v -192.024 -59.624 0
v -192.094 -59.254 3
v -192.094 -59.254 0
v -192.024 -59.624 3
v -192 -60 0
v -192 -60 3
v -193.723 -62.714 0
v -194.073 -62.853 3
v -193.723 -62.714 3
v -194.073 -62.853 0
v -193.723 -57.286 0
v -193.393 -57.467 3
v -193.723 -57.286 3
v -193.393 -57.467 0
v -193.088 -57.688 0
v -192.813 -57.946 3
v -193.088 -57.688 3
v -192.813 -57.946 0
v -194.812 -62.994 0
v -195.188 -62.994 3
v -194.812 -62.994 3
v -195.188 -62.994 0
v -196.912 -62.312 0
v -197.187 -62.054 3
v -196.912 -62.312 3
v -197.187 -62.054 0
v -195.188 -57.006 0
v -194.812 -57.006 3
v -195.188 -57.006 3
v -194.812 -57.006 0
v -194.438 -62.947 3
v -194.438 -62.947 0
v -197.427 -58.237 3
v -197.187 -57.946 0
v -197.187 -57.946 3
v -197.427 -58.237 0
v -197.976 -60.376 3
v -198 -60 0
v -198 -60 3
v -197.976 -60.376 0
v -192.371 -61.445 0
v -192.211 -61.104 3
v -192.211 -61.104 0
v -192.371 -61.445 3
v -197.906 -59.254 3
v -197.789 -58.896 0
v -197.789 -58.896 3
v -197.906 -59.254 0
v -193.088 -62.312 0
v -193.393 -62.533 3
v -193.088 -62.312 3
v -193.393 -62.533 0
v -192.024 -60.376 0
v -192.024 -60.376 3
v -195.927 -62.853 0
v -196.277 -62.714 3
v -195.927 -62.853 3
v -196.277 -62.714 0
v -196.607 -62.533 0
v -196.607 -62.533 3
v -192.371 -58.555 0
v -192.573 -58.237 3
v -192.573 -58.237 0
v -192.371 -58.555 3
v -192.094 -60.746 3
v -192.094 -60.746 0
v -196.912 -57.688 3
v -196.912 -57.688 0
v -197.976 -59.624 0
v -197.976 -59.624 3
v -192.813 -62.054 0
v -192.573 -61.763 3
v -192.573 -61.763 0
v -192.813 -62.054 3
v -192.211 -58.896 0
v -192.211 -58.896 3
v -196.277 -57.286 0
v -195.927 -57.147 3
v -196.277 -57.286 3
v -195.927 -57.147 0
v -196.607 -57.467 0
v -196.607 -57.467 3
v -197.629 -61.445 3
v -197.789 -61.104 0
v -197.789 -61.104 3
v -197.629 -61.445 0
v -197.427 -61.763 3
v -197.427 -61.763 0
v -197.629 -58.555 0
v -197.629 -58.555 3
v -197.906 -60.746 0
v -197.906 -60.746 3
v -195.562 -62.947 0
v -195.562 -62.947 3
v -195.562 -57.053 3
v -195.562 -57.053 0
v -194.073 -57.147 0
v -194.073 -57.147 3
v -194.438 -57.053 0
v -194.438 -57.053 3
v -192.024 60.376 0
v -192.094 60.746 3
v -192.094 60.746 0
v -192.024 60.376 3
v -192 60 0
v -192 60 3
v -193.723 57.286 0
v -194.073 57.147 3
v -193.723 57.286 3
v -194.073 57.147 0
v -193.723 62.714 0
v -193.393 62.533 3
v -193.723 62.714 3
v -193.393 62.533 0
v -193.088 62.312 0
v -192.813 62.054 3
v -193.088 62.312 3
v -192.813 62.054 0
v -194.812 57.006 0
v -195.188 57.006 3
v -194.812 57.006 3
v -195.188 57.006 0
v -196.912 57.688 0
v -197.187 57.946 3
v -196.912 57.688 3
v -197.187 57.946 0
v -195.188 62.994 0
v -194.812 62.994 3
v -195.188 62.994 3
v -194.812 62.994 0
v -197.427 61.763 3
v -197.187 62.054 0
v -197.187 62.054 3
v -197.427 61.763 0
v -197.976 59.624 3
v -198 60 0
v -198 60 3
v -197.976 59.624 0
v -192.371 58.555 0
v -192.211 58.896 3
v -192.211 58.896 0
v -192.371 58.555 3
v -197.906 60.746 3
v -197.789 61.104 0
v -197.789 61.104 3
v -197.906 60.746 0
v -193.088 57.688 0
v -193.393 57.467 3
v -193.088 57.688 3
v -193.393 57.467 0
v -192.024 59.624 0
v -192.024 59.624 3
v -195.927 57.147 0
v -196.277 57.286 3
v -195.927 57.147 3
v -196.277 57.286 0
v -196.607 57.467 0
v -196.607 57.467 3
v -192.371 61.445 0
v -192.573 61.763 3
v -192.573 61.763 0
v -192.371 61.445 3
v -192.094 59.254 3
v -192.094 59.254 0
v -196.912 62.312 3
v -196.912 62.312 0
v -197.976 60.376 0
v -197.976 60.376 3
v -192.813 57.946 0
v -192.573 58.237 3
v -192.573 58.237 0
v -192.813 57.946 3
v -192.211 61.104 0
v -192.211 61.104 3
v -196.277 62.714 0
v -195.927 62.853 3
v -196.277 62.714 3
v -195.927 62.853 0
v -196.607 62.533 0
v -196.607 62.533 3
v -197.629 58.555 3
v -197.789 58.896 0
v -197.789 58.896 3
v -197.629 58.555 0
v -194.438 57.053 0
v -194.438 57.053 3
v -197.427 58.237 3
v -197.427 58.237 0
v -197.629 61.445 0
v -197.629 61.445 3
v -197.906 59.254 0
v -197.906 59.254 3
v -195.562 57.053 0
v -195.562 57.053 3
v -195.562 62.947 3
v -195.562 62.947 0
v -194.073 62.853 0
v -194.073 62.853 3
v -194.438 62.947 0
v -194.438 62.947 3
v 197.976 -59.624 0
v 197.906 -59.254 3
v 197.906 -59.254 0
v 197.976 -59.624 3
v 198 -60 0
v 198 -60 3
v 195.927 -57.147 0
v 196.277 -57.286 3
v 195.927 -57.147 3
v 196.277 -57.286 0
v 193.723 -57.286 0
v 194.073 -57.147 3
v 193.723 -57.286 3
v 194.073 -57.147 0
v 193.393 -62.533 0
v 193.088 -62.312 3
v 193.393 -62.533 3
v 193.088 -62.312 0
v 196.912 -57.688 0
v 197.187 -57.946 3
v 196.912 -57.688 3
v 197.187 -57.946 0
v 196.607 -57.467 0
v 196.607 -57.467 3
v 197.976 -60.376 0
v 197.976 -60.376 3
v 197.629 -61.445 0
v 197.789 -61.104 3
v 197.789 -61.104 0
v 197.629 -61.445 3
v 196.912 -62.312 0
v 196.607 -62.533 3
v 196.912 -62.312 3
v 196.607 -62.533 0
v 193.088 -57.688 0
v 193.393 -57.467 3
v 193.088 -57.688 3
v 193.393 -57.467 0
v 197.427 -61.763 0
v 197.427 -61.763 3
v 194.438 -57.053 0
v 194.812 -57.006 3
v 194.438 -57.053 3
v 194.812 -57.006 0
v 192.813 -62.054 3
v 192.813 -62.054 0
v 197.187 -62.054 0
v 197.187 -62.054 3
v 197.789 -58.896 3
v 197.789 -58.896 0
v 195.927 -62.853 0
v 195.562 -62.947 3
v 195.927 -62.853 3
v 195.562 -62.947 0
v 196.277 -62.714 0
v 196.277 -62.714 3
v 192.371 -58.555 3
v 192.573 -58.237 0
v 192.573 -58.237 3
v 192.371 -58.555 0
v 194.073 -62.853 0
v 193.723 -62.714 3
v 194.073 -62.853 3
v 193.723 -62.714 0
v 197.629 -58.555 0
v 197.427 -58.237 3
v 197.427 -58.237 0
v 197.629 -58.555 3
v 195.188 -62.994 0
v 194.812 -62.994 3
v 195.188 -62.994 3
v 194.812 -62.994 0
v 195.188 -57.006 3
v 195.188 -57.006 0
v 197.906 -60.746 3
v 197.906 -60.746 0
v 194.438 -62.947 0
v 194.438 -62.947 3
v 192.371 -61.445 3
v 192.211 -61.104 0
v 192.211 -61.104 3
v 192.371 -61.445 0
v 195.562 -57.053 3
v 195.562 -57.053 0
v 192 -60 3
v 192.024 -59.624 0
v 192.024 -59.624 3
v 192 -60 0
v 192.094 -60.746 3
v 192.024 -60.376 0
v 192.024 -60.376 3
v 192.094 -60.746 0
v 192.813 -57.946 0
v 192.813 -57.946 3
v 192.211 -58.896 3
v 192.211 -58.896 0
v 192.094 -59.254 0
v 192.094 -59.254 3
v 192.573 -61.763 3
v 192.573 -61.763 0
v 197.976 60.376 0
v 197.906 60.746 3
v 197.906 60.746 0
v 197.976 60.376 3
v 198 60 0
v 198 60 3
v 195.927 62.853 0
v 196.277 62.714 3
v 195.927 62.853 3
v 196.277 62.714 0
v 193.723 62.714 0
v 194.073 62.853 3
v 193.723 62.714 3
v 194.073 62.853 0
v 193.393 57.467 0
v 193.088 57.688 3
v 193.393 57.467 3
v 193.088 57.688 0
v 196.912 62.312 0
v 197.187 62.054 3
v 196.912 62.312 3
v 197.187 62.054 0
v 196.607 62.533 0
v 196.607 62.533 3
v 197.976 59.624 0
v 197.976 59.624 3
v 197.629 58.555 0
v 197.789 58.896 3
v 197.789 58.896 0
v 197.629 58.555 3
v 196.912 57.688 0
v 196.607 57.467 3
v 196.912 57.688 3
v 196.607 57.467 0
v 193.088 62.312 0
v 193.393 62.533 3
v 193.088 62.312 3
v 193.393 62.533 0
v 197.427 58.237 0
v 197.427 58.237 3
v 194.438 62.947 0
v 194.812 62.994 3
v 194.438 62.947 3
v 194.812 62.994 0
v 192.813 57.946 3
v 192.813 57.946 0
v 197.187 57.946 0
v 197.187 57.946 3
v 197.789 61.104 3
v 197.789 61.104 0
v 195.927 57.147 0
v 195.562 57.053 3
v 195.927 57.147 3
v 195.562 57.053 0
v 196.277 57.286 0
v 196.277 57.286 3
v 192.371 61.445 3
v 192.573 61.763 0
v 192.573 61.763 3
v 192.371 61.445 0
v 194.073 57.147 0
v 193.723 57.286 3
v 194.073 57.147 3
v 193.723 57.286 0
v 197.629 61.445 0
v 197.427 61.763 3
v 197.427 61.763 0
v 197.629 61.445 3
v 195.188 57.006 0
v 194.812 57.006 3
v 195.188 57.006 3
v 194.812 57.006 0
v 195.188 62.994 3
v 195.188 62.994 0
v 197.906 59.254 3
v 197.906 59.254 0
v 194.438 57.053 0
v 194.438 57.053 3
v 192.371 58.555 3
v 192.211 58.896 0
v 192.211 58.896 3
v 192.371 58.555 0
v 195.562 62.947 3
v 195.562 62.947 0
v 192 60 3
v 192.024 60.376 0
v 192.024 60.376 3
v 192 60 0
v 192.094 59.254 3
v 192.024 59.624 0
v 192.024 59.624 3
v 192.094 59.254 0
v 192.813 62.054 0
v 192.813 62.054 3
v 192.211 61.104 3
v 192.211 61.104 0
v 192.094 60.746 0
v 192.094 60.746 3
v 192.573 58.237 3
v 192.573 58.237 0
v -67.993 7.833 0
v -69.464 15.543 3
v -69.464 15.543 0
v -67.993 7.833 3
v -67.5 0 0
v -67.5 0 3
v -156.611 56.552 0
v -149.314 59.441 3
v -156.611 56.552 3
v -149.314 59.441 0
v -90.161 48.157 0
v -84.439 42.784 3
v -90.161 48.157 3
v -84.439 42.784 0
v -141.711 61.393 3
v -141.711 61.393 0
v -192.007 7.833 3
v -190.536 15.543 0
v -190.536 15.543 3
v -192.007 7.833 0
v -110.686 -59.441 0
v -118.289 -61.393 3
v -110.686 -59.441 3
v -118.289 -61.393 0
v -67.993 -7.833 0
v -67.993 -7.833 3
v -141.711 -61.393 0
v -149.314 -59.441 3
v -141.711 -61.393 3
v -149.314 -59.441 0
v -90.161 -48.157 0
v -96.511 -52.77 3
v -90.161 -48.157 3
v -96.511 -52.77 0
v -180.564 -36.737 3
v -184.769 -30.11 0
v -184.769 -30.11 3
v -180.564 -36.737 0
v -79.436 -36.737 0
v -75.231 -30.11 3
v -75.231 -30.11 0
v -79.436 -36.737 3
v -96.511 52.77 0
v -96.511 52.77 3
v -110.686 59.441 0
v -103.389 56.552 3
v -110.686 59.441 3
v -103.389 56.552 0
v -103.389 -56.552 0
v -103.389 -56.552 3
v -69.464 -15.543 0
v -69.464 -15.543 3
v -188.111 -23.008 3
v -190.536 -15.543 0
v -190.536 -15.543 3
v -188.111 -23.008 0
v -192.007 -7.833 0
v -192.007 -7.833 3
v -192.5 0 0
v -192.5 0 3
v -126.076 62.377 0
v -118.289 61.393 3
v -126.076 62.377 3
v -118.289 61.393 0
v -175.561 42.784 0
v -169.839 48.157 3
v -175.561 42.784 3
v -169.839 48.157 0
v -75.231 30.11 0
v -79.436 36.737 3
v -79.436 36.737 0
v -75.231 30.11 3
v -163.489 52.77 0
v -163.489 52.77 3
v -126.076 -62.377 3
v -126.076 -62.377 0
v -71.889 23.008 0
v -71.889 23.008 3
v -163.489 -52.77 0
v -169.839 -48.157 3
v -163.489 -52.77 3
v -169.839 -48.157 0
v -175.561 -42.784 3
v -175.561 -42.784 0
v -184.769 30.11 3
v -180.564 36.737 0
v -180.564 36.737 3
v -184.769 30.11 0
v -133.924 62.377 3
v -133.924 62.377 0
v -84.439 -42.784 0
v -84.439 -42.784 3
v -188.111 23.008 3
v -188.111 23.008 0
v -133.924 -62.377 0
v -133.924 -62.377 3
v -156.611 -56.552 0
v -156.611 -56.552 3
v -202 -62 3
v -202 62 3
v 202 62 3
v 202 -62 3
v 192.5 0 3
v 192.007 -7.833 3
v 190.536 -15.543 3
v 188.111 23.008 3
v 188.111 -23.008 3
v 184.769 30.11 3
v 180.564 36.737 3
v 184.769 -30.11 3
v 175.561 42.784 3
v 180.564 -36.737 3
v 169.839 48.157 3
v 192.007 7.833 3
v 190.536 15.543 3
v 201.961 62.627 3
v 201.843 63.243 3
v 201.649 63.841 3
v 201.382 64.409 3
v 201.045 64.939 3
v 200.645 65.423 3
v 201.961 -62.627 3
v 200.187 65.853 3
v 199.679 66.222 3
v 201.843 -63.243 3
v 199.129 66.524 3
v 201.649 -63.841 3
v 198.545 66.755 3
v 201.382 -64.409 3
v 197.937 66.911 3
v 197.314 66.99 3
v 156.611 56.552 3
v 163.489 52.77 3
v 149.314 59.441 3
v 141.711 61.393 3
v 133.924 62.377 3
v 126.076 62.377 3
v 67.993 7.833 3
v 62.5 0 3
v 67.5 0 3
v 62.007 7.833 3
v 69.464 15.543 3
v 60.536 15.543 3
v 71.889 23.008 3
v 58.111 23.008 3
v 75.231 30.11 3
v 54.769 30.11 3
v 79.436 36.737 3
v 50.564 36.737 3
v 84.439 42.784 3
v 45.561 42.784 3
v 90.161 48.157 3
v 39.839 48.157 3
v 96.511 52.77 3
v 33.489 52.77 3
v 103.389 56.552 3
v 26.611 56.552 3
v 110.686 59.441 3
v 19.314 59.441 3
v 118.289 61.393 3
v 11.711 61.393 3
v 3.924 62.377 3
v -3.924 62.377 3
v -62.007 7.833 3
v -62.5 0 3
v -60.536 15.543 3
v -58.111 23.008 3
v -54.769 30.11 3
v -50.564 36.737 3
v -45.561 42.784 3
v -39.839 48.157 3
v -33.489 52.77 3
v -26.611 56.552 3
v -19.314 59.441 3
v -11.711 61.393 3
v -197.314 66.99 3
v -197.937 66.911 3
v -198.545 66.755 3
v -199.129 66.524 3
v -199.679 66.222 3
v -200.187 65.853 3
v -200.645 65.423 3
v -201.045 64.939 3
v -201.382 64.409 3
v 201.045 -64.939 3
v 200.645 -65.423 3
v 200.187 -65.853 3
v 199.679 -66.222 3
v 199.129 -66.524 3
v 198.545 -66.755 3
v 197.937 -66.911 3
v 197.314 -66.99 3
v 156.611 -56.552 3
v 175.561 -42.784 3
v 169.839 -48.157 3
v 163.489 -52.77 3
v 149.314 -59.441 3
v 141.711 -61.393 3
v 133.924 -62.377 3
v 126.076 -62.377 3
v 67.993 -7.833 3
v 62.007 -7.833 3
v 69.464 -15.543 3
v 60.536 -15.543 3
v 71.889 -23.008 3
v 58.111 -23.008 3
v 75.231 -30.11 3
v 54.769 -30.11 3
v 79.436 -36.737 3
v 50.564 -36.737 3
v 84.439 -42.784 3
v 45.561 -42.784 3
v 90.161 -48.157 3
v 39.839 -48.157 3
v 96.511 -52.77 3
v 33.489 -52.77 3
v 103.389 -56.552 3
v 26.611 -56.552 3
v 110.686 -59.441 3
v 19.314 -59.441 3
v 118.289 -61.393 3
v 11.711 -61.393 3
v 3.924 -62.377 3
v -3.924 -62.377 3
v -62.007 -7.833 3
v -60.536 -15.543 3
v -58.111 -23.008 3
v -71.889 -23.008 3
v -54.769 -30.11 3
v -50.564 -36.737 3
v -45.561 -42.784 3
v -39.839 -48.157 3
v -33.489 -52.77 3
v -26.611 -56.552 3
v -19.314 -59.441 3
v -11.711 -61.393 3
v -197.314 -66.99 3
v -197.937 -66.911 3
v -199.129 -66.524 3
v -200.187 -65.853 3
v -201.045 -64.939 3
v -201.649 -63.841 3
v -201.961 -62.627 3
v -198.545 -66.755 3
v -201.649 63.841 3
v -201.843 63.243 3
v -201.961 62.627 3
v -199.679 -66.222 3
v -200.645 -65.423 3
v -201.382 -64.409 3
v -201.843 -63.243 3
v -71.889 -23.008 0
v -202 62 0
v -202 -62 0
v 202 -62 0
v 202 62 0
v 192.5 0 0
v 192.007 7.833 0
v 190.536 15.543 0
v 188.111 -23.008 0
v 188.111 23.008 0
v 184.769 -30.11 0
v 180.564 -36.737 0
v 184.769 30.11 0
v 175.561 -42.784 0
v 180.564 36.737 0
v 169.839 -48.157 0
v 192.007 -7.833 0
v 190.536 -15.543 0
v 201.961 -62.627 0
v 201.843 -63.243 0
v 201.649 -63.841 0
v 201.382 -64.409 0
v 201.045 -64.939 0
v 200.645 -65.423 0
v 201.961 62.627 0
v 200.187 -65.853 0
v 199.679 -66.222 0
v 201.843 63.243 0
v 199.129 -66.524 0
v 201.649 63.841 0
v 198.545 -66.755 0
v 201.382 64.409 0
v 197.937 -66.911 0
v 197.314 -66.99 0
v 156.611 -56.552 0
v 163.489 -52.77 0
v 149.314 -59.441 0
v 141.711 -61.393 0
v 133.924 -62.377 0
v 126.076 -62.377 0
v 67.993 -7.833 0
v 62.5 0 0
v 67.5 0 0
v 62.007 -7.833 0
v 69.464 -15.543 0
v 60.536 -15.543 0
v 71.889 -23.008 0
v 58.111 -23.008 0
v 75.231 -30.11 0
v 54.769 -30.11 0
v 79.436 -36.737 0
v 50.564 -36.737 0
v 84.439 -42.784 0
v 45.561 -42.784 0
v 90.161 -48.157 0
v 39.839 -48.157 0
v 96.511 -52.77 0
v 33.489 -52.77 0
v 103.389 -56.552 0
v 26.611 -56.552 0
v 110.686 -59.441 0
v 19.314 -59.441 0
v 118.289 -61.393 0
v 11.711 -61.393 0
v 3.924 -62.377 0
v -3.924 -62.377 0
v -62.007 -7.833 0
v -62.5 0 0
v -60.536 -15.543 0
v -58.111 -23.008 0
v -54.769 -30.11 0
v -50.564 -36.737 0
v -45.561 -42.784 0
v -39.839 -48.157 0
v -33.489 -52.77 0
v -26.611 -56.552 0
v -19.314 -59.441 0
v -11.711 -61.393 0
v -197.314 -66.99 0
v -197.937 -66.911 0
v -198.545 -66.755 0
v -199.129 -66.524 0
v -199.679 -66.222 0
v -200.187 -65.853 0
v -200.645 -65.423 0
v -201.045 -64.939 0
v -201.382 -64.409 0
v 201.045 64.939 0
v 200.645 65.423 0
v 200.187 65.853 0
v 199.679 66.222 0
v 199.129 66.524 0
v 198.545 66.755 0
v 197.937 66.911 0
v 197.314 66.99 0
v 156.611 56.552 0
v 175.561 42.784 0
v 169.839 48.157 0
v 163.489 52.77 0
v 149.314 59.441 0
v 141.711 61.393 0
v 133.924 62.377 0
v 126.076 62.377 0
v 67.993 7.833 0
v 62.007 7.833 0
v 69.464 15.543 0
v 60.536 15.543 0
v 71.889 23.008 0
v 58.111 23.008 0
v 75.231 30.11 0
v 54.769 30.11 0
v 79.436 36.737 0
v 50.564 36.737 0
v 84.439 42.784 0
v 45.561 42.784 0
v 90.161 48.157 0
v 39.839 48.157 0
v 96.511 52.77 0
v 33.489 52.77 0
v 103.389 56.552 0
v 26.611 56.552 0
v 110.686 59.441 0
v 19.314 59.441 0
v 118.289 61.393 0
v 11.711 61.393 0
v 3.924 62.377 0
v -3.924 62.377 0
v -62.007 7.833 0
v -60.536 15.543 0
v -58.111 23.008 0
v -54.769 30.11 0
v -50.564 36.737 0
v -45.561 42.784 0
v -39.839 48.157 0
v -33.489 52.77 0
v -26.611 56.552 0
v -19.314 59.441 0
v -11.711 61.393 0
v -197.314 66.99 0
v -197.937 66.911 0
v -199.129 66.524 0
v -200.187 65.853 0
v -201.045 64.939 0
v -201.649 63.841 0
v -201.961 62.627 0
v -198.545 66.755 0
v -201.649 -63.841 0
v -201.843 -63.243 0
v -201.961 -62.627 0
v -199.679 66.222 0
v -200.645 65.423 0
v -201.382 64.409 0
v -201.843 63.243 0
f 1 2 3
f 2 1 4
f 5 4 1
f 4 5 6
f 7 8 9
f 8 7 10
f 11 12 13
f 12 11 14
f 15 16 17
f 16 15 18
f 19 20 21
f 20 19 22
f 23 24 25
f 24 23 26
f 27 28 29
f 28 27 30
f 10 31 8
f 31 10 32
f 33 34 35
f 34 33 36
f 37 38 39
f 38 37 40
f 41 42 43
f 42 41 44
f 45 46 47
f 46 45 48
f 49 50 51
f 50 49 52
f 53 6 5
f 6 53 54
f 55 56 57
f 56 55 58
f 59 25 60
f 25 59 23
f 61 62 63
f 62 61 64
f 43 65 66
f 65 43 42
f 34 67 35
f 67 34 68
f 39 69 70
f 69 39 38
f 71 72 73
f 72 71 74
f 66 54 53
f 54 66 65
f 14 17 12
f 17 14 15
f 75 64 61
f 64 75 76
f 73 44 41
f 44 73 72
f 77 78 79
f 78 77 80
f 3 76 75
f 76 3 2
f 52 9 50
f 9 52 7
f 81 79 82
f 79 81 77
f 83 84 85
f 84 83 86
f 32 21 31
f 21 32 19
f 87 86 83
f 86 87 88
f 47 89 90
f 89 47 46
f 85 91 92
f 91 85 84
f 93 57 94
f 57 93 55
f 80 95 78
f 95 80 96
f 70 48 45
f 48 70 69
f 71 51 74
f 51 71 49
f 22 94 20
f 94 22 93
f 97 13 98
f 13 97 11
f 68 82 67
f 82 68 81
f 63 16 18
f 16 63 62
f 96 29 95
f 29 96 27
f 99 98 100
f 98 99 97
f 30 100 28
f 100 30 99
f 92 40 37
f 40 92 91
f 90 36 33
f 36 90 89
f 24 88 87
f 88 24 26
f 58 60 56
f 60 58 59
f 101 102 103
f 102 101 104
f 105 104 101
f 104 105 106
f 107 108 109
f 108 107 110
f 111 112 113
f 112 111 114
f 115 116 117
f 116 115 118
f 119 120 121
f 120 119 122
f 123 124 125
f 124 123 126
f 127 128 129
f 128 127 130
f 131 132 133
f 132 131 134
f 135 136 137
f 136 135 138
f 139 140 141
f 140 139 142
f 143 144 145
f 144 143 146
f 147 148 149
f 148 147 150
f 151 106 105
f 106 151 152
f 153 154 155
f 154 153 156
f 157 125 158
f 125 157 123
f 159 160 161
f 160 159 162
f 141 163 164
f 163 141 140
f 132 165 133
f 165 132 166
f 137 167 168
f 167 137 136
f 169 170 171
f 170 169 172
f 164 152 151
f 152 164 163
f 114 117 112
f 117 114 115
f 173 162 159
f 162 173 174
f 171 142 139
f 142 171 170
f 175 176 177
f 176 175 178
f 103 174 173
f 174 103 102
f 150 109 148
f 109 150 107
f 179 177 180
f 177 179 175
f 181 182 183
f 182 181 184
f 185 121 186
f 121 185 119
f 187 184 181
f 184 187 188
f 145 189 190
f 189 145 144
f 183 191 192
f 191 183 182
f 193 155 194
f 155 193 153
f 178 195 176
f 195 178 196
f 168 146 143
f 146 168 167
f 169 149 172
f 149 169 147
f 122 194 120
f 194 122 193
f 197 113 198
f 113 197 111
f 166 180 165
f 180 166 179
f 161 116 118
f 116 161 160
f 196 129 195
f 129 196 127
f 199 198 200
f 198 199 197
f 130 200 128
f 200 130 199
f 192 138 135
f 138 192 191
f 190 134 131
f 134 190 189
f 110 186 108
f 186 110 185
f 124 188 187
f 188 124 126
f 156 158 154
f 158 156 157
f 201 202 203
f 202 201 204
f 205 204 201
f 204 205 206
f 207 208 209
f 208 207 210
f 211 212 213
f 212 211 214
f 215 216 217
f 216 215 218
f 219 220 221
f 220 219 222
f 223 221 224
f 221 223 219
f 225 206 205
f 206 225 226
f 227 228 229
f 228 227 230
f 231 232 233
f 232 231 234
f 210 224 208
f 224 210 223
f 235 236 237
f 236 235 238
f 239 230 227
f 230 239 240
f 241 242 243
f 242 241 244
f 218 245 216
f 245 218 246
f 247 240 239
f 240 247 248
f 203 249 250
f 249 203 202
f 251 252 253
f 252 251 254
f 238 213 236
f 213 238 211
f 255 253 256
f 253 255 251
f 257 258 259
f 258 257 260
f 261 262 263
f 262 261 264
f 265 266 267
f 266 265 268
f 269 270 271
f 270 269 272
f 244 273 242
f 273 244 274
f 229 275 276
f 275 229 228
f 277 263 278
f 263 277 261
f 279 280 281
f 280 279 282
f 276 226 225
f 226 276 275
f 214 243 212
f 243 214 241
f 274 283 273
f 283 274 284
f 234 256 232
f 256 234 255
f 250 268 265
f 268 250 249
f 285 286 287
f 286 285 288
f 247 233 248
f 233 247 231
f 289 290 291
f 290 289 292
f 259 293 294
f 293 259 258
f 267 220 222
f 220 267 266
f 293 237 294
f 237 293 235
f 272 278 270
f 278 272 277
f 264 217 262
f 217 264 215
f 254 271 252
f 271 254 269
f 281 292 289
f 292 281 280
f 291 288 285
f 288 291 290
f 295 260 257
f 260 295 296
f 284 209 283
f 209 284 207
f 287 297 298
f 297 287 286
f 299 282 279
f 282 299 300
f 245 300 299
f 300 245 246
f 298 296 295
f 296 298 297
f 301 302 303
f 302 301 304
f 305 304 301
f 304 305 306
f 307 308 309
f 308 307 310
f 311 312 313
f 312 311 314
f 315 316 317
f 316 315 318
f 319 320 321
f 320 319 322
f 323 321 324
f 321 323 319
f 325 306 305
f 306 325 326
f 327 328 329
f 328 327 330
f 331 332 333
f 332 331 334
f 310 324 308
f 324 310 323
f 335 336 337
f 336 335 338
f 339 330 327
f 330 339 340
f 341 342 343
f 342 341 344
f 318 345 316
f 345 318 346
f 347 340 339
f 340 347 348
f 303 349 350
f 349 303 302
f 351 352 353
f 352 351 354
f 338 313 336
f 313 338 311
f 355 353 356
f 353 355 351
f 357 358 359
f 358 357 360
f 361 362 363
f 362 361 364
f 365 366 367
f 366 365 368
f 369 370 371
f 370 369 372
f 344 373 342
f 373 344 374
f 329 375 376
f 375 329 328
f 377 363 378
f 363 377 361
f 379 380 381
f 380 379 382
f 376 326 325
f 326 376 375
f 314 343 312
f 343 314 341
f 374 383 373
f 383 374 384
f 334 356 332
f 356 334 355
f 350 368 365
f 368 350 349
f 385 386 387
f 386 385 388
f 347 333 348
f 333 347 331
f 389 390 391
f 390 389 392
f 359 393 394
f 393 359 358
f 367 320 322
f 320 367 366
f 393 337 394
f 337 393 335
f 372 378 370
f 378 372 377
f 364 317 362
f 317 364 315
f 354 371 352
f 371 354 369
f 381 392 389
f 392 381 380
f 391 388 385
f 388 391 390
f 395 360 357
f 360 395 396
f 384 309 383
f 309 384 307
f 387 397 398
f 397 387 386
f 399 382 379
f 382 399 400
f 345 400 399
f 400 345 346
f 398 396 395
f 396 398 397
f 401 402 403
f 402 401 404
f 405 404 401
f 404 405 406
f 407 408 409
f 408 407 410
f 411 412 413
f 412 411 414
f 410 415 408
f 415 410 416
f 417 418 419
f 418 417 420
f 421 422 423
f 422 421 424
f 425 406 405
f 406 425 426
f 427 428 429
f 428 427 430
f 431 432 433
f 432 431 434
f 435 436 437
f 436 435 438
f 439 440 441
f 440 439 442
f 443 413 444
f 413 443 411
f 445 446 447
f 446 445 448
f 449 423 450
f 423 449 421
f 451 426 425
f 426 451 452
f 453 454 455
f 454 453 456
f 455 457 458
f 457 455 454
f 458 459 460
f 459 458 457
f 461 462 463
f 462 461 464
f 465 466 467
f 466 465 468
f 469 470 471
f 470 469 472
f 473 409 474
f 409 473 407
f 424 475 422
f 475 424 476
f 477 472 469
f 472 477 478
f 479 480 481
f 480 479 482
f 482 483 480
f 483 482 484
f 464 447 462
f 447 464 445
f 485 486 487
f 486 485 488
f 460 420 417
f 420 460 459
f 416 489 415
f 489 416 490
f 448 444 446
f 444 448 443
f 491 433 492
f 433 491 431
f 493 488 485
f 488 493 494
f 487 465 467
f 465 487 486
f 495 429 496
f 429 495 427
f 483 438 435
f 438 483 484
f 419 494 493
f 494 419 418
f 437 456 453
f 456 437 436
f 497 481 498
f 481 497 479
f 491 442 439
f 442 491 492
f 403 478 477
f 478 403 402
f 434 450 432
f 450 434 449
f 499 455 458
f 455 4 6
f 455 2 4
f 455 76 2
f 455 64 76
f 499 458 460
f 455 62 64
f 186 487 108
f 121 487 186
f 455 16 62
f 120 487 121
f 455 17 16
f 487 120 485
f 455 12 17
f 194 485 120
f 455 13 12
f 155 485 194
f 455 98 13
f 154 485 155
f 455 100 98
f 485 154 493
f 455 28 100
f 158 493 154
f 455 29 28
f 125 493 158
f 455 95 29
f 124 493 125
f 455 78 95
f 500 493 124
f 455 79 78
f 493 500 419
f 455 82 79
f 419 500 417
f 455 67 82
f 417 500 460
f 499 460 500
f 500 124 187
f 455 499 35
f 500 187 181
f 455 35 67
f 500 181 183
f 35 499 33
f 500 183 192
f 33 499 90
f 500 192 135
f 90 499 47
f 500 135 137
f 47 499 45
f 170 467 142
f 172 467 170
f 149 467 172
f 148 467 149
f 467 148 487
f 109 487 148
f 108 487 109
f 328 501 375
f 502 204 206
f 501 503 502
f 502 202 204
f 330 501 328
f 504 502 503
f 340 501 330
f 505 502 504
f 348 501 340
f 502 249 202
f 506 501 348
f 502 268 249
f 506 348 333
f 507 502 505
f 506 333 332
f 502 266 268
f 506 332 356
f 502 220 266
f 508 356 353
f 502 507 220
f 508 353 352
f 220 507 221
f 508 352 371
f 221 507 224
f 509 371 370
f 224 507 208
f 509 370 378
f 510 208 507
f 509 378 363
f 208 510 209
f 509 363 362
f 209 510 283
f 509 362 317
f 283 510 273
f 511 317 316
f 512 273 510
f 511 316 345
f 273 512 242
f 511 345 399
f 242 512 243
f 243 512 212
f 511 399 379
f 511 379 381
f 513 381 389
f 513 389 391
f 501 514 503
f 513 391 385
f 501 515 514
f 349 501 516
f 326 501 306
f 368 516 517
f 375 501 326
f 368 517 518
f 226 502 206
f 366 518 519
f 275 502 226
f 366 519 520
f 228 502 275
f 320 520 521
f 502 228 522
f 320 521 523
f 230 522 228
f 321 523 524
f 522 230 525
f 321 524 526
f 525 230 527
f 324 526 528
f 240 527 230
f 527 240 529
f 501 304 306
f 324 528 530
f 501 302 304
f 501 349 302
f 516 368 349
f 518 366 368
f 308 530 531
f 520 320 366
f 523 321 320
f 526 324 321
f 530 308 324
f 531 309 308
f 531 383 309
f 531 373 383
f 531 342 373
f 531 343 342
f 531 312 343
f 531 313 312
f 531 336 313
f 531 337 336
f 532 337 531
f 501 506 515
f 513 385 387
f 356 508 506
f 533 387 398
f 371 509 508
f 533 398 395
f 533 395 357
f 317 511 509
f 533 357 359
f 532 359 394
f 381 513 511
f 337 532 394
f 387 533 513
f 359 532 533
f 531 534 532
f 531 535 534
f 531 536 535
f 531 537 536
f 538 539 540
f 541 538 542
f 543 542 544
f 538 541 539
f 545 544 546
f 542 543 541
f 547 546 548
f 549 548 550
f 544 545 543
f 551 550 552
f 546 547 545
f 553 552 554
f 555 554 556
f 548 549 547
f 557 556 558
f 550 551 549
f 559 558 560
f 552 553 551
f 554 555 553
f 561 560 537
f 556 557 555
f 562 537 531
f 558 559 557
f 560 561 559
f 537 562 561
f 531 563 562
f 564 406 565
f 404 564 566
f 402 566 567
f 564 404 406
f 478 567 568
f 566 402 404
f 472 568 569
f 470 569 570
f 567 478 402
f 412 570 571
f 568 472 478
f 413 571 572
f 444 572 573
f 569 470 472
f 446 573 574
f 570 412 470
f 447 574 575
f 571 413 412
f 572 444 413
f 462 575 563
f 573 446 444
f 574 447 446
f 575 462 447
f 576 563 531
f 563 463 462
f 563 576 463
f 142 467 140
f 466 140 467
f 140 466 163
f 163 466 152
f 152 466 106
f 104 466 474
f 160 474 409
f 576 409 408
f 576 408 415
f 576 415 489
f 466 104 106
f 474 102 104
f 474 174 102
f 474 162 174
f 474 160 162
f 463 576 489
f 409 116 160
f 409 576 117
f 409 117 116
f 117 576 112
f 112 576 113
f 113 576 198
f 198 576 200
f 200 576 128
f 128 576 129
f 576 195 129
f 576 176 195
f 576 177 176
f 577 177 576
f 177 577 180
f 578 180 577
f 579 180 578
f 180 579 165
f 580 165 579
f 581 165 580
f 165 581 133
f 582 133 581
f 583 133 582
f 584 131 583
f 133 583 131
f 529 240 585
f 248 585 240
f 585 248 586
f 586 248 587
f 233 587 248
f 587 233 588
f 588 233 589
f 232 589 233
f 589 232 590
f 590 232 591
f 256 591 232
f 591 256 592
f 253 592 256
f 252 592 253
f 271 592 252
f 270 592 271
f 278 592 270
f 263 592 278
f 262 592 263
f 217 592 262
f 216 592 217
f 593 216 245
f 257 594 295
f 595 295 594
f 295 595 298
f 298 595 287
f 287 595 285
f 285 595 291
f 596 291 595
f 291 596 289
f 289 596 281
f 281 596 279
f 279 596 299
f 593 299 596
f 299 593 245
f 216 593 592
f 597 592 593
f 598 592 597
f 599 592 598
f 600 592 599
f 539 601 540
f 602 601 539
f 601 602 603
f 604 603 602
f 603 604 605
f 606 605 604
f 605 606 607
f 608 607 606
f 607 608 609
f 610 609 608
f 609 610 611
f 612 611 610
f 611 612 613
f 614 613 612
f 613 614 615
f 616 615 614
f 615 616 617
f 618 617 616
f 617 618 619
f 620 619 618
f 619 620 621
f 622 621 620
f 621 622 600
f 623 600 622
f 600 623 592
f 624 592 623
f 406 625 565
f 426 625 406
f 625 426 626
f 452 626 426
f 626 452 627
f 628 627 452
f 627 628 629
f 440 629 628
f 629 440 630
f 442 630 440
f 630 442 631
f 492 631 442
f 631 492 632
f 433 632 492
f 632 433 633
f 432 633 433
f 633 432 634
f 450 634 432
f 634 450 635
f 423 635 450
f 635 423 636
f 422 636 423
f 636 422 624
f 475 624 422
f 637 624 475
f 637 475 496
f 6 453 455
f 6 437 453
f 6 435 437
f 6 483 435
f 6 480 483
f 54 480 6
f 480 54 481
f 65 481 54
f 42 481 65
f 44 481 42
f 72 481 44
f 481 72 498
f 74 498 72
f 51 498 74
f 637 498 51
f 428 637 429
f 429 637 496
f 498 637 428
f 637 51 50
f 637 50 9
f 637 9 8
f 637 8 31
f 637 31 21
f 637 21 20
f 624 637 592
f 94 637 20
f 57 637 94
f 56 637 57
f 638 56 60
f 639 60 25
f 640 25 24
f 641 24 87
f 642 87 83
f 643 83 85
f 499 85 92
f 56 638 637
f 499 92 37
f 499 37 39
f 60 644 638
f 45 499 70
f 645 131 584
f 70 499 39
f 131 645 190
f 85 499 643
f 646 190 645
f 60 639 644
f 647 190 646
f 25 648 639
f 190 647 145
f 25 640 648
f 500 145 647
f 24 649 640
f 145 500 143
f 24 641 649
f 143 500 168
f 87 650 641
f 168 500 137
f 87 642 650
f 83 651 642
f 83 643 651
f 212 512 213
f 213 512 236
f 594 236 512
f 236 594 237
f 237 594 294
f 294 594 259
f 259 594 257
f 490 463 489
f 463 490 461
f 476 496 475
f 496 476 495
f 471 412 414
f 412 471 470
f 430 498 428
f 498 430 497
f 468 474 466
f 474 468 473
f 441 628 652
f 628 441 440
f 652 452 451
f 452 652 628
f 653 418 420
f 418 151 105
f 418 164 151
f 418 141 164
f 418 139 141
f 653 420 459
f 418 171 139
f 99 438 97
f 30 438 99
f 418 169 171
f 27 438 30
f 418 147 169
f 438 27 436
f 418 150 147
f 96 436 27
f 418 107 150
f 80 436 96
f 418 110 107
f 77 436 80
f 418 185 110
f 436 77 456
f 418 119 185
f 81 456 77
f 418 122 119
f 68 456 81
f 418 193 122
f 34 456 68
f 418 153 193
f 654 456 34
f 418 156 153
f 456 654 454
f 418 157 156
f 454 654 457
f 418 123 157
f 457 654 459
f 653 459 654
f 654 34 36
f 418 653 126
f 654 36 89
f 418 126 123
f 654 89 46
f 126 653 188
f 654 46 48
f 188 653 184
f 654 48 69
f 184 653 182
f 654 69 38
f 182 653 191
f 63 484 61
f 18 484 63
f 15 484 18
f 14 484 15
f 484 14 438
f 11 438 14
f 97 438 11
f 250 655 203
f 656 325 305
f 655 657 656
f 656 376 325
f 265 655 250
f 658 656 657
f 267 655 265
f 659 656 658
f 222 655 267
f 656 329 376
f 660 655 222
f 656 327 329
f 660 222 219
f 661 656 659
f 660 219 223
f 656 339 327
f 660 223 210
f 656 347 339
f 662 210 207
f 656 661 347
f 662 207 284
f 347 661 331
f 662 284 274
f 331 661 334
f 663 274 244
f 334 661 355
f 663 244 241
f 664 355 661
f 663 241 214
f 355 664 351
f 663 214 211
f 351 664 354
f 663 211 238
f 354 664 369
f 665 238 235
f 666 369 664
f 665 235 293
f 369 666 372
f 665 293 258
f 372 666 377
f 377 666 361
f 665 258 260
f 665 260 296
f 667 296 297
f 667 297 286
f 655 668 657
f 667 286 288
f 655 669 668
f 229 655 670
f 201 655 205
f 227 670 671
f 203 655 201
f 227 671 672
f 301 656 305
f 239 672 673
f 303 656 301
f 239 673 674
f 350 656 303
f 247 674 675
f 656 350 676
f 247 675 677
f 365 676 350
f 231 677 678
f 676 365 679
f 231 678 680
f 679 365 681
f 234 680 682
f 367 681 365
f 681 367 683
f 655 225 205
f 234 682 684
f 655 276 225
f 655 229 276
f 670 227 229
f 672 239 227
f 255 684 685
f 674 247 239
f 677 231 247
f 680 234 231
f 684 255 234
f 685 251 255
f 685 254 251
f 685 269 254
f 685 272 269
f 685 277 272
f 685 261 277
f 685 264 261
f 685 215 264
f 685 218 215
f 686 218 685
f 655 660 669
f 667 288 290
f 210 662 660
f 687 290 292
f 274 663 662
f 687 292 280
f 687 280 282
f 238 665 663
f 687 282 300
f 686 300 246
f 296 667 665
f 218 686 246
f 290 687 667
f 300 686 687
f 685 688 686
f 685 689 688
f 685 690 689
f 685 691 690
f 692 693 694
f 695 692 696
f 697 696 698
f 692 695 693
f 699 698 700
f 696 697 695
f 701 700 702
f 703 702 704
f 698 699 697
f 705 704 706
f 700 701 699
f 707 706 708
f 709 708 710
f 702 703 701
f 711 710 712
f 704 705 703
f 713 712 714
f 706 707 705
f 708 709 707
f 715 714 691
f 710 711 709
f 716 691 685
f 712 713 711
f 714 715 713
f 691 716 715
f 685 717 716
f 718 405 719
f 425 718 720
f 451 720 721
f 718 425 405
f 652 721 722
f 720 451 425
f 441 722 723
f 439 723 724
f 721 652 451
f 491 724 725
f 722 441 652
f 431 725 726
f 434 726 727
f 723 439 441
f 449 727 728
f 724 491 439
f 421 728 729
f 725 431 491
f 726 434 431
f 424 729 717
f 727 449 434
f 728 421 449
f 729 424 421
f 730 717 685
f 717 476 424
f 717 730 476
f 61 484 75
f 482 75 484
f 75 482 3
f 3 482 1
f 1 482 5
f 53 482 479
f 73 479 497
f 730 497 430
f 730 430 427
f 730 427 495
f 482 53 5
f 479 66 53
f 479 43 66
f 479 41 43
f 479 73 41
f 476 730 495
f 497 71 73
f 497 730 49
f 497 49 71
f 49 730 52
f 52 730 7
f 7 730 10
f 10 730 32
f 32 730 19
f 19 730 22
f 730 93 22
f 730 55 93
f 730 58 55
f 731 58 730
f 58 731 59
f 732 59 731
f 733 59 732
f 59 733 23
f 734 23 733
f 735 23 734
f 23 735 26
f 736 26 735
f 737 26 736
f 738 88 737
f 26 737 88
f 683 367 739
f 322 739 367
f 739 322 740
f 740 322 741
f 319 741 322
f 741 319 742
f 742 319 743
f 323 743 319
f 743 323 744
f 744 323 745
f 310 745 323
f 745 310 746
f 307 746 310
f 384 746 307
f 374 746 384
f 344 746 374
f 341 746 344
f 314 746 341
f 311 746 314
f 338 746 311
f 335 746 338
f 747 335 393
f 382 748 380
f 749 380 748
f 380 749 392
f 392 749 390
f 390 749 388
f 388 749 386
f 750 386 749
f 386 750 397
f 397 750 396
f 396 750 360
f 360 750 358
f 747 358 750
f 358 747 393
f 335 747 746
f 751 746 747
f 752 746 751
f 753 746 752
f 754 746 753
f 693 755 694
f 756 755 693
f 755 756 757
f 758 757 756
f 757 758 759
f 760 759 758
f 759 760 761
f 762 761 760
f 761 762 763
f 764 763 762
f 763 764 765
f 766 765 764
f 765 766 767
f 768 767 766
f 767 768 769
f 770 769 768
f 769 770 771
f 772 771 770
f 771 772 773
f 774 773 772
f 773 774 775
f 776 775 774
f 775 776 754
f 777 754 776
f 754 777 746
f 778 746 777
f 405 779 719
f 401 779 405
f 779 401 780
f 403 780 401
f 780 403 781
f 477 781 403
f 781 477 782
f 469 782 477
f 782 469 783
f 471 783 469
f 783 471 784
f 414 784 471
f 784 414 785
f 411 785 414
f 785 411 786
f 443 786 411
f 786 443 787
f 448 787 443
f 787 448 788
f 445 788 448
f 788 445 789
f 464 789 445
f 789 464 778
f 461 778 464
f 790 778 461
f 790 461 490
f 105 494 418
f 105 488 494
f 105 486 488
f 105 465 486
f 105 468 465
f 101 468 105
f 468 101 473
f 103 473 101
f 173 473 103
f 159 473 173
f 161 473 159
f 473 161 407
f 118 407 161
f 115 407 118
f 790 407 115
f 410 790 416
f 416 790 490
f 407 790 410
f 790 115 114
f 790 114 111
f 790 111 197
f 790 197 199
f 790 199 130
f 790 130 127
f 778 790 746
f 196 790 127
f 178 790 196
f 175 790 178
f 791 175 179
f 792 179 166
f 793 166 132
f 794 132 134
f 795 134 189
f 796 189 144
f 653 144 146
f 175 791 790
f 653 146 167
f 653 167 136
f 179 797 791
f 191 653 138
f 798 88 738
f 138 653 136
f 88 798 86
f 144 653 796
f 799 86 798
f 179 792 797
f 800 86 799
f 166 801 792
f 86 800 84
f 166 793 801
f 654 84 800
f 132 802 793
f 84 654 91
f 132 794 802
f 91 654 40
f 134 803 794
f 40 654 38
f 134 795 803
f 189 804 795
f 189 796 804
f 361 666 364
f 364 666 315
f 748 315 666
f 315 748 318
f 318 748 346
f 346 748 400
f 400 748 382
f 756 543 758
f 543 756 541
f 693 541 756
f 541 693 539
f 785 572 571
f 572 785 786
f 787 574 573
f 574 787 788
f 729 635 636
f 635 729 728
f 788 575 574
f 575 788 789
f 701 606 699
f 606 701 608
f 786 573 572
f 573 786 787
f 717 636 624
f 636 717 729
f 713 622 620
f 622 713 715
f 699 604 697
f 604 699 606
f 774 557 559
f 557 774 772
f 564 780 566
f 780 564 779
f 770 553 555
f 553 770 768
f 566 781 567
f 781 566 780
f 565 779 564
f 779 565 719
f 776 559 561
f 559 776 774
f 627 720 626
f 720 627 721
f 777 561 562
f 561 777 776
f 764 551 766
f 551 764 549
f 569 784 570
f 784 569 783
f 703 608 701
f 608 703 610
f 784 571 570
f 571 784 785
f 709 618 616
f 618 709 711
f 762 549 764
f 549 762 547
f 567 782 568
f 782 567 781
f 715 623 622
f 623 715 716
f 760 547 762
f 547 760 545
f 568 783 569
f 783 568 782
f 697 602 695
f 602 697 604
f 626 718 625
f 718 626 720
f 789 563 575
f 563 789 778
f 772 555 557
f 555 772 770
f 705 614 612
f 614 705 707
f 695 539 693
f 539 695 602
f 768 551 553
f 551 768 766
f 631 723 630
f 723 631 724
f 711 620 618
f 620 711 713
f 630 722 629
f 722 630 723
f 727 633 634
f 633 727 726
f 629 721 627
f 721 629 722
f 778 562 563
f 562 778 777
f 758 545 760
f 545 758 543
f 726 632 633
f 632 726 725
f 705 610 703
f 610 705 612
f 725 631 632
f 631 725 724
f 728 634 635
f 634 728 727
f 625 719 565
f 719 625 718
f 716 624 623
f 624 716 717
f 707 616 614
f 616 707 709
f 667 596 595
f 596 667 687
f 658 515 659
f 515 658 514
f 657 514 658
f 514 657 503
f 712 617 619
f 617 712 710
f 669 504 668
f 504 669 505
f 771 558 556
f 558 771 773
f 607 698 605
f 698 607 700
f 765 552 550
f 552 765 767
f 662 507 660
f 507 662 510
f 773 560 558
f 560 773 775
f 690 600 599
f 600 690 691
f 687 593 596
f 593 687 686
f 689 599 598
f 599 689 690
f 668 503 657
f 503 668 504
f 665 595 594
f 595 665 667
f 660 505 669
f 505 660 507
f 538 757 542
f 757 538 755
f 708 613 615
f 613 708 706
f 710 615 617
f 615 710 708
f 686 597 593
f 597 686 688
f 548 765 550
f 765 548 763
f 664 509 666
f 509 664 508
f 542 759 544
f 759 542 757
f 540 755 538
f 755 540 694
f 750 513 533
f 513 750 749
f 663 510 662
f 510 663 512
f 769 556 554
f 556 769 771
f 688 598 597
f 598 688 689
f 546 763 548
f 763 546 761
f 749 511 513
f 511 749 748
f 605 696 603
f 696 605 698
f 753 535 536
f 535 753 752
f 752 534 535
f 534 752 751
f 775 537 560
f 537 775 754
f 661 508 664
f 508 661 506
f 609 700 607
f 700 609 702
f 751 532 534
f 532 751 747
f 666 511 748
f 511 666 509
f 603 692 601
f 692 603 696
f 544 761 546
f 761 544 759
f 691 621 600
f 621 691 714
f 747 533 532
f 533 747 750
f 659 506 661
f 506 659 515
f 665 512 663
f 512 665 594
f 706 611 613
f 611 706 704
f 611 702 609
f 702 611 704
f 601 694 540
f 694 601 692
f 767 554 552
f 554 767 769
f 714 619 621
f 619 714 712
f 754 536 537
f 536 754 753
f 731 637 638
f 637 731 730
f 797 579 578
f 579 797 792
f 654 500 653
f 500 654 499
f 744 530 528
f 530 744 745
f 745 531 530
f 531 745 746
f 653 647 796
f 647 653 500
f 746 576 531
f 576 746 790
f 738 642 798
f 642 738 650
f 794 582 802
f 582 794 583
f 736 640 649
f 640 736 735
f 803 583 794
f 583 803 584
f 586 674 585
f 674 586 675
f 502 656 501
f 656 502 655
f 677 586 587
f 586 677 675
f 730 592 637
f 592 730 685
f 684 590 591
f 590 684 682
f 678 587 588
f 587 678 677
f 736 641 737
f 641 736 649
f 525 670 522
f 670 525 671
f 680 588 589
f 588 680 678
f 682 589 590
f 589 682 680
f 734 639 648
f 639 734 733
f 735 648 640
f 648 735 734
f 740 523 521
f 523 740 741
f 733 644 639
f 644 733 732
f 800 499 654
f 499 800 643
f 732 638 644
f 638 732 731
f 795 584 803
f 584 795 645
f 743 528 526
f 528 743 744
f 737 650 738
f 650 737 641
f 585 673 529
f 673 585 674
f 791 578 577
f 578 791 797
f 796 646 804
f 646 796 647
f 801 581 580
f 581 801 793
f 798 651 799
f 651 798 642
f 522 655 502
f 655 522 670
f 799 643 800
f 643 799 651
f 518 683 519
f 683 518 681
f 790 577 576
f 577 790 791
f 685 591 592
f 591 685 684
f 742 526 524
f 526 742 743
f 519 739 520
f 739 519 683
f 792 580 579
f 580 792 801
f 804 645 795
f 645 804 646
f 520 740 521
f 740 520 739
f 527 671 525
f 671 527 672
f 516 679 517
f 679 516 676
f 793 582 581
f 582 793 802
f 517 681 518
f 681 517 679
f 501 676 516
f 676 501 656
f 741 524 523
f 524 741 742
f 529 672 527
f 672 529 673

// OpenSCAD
$fn = 50;


difference() {
	union() {
		hull() {
			translate(v = [-197.0000000000, 62.0000000000, 0]) {
				cylinder(h = 3, r = 5);
			}
			translate(v = [197.0000000000, 62.0000000000, 0]) {
				cylinder(h = 3, r = 5);
			}
			translate(v = [-197.0000000000, -62.0000000000, 0]) {
				cylinder(h = 3, r = 5);
			}
			translate(v = [197.0000000000, -62.0000000000, 0]) {
				cylinder(h = 3, r = 5);
			}
		}
	}
	union() {
		#translate(v = [-195.0000000000, -60.0000000000, -100.0000000000]) {
			cylinder(h = 200, r = 3.0000000000);
		}
		#translate(v = [-195.0000000000, 60.0000000000, -100.0000000000]) {
			cylinder(h = 200, r = 3.0000000000);
		}
		#translate(v = [195.0000000000, -60.0000000000, -100.0000000000]) {
			cylinder(h = 200, r = 3.0000000000);
		}
		#translate(v = [195.0000000000, 60.0000000000, -100.0000000000]) {
			cylinder(h = 200, r = 3.0000000000);
		}
		#translate(v = [-130.0000000000, 0, 0]) {
			cylinder(h = 3, r = 62.5000000000);
		}
		#cylinder(h = 3, r = 62.5000000000);
		#translate(v = [130.0000000000, 0, 0]) {
			cylinder(h = 3, r = 62.5000000000);
		}
	}
}
